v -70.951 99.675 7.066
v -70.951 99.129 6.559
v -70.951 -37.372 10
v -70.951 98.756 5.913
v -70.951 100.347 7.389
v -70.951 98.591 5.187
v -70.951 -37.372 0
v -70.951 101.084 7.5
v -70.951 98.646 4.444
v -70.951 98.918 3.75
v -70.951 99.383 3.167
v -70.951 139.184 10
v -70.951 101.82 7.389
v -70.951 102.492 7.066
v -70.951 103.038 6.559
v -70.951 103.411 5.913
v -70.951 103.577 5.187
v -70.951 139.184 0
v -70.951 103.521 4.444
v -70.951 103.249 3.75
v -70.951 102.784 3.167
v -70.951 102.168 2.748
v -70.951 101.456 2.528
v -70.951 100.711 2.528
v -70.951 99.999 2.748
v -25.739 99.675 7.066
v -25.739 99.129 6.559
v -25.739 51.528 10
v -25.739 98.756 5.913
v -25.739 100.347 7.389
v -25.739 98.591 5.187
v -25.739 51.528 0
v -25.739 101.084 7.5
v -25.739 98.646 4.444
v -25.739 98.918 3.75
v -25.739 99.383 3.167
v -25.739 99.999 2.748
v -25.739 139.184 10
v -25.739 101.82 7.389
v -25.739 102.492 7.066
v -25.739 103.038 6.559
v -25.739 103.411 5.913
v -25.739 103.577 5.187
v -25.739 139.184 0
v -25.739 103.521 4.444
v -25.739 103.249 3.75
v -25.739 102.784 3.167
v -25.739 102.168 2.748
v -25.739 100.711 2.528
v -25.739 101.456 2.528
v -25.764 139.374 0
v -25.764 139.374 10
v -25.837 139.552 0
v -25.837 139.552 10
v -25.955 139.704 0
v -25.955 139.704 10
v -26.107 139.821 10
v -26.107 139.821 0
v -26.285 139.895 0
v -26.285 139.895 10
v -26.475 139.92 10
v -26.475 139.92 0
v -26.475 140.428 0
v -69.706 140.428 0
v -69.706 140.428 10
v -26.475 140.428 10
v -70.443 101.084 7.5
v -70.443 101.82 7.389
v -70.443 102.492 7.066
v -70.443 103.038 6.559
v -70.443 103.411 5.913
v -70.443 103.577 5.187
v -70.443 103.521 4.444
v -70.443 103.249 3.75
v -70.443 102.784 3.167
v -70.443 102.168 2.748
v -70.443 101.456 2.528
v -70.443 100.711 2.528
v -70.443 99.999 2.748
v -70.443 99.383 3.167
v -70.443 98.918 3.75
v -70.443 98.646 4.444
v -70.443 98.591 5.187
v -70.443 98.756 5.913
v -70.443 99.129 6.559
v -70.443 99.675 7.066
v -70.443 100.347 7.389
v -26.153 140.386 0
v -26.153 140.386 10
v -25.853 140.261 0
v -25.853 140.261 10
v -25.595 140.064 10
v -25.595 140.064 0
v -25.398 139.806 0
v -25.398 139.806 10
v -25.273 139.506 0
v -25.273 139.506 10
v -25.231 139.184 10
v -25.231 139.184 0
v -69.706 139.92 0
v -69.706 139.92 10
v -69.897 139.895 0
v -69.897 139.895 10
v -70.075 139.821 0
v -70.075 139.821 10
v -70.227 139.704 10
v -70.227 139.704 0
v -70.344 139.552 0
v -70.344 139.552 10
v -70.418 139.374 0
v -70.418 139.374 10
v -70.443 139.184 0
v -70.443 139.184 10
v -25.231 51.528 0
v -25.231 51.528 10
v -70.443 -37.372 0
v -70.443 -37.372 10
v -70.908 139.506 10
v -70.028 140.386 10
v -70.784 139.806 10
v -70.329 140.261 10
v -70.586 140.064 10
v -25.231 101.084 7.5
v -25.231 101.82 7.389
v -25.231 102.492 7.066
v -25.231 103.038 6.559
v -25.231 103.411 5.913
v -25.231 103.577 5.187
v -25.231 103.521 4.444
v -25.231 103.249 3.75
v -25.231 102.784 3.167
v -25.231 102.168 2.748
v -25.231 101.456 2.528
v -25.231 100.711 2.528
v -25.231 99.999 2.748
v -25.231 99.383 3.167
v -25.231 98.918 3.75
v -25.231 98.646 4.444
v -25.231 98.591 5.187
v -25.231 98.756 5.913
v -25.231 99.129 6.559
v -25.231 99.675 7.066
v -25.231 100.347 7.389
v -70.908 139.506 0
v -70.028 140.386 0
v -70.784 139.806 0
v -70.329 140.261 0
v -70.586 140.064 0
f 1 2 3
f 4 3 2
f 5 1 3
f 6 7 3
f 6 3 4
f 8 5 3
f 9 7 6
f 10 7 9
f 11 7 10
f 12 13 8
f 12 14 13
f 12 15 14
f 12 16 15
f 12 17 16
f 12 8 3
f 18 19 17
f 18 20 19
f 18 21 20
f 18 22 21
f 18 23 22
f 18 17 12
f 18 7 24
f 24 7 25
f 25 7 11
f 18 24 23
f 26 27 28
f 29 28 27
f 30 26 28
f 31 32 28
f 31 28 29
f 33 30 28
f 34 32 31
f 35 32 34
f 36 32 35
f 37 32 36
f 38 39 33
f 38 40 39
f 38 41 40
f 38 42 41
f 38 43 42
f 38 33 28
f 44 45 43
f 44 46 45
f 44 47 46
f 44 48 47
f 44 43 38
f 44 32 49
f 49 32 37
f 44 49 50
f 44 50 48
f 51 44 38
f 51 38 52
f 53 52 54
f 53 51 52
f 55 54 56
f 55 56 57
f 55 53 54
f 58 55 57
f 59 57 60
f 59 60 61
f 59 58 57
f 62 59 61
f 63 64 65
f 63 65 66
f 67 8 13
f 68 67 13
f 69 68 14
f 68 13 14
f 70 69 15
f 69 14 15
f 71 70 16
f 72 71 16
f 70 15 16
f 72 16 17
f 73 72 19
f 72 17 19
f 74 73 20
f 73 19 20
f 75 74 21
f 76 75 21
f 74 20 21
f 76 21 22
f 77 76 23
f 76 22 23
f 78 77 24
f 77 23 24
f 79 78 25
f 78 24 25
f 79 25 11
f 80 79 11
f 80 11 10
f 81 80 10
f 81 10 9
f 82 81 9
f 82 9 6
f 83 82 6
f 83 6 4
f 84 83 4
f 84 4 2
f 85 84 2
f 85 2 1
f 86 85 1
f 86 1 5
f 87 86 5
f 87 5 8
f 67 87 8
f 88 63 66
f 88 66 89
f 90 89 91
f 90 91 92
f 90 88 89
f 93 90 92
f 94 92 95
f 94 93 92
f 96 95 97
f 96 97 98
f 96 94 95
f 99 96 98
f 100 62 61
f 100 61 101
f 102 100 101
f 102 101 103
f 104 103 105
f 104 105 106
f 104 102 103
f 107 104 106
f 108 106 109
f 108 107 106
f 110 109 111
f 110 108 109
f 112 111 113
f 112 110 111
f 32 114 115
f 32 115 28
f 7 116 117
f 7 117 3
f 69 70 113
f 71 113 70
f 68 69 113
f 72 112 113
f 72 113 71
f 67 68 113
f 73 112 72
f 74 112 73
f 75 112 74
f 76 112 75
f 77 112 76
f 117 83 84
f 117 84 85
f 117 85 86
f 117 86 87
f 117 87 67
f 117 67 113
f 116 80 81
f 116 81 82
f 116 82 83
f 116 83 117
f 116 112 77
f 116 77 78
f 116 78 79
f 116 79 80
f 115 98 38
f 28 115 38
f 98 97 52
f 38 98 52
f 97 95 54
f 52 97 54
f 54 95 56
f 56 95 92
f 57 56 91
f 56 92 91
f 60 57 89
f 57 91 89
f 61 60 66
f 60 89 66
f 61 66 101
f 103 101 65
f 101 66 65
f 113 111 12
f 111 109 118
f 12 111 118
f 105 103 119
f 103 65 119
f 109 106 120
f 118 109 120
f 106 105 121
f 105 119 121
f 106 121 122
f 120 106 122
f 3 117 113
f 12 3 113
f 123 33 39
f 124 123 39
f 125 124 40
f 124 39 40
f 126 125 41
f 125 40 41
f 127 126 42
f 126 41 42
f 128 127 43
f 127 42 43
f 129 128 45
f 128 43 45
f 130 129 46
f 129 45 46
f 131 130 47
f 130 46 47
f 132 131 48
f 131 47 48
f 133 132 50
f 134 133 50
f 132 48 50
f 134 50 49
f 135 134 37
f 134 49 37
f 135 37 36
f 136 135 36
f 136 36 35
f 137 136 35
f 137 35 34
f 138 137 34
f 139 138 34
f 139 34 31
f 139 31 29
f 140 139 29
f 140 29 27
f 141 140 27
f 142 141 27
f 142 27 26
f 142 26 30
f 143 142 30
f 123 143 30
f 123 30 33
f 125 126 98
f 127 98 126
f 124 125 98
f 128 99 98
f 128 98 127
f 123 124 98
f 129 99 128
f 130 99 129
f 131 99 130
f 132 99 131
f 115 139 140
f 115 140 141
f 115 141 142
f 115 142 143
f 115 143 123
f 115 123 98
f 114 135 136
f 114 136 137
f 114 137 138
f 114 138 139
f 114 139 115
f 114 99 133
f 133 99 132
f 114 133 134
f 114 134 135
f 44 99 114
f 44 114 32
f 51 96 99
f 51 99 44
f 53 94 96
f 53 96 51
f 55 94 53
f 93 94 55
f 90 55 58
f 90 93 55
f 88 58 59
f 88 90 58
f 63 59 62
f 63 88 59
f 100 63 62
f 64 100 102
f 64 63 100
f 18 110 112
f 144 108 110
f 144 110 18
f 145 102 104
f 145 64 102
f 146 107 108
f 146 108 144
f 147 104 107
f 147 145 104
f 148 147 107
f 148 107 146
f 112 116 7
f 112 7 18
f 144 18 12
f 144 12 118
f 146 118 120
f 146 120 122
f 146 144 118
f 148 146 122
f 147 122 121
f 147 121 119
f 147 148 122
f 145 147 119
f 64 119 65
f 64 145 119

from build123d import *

# Parameters (mm, degrees)
BASE_FLANGE3_DEPTH = 10
SKETCH15_R         = 2.5
CUT_EXTRUDE1_DEPTH = 45.72


# Sheet-metal steps are written as plain solids
with BuildPart() as part:
    # Sketch12 → Base-Flange3 (new body)
    with BuildSketch(Plane.XY):
        with BuildLine():
            Line((-70.950809652, -37.371859757), (-70.950809652, 139.183540243))
            ThreePointArc((-70.950809652, 139.183540243), (-70.586274752, 140.063605343), (-69.706209652, 140.428140243))
            Line((-69.706209652, 140.428140243), (-26.475409652, 140.428140243))
            ThreePointArc((-26.475409652, 140.428140243), (-25.595344552, 140.063605343), (-25.230809652, 139.183540243))
            Line((-25.230809652, 139.183540243), (-25.230809652, 51.528140243))
            Line((-25.230809652, 51.528140243), (-25.738809652, 51.528140243))
            Line((-25.738809652, 51.528140243), (-25.738809652, 139.183540243))
            ThreePointArc((-25.738809652, 139.183540243), (-25.954554797, 139.704395098), (-26.475409652, 139.920140243))
            Line((-26.475409652, 139.920140243), (-69.706209652, 139.920140243))
            ThreePointArc((-69.706209652, 139.920140243), (-70.227064507, 139.704395098), (-70.442809652, 139.183540243))
            Line((-70.442809652, 139.183540243), (-70.442809652, -37.371859757))
            Line((-70.442809652, -37.371859757), (-70.950809652, -37.371859757))
        make_face()
    extrude(amount=BASE_FLANGE3_DEPTH)

    # Sketch15 → Cut-Extrude1 (cut)
    with BuildSketch(Plane.ZY.offset(70.950809652)):
        with Locations((5, 101.083540243)):
            Circle(SKETCH15_R)
    extrude(amount=-CUT_EXTRUDE1_DEPTH, mode=Mode.SUBTRACT)


solid = part.part
